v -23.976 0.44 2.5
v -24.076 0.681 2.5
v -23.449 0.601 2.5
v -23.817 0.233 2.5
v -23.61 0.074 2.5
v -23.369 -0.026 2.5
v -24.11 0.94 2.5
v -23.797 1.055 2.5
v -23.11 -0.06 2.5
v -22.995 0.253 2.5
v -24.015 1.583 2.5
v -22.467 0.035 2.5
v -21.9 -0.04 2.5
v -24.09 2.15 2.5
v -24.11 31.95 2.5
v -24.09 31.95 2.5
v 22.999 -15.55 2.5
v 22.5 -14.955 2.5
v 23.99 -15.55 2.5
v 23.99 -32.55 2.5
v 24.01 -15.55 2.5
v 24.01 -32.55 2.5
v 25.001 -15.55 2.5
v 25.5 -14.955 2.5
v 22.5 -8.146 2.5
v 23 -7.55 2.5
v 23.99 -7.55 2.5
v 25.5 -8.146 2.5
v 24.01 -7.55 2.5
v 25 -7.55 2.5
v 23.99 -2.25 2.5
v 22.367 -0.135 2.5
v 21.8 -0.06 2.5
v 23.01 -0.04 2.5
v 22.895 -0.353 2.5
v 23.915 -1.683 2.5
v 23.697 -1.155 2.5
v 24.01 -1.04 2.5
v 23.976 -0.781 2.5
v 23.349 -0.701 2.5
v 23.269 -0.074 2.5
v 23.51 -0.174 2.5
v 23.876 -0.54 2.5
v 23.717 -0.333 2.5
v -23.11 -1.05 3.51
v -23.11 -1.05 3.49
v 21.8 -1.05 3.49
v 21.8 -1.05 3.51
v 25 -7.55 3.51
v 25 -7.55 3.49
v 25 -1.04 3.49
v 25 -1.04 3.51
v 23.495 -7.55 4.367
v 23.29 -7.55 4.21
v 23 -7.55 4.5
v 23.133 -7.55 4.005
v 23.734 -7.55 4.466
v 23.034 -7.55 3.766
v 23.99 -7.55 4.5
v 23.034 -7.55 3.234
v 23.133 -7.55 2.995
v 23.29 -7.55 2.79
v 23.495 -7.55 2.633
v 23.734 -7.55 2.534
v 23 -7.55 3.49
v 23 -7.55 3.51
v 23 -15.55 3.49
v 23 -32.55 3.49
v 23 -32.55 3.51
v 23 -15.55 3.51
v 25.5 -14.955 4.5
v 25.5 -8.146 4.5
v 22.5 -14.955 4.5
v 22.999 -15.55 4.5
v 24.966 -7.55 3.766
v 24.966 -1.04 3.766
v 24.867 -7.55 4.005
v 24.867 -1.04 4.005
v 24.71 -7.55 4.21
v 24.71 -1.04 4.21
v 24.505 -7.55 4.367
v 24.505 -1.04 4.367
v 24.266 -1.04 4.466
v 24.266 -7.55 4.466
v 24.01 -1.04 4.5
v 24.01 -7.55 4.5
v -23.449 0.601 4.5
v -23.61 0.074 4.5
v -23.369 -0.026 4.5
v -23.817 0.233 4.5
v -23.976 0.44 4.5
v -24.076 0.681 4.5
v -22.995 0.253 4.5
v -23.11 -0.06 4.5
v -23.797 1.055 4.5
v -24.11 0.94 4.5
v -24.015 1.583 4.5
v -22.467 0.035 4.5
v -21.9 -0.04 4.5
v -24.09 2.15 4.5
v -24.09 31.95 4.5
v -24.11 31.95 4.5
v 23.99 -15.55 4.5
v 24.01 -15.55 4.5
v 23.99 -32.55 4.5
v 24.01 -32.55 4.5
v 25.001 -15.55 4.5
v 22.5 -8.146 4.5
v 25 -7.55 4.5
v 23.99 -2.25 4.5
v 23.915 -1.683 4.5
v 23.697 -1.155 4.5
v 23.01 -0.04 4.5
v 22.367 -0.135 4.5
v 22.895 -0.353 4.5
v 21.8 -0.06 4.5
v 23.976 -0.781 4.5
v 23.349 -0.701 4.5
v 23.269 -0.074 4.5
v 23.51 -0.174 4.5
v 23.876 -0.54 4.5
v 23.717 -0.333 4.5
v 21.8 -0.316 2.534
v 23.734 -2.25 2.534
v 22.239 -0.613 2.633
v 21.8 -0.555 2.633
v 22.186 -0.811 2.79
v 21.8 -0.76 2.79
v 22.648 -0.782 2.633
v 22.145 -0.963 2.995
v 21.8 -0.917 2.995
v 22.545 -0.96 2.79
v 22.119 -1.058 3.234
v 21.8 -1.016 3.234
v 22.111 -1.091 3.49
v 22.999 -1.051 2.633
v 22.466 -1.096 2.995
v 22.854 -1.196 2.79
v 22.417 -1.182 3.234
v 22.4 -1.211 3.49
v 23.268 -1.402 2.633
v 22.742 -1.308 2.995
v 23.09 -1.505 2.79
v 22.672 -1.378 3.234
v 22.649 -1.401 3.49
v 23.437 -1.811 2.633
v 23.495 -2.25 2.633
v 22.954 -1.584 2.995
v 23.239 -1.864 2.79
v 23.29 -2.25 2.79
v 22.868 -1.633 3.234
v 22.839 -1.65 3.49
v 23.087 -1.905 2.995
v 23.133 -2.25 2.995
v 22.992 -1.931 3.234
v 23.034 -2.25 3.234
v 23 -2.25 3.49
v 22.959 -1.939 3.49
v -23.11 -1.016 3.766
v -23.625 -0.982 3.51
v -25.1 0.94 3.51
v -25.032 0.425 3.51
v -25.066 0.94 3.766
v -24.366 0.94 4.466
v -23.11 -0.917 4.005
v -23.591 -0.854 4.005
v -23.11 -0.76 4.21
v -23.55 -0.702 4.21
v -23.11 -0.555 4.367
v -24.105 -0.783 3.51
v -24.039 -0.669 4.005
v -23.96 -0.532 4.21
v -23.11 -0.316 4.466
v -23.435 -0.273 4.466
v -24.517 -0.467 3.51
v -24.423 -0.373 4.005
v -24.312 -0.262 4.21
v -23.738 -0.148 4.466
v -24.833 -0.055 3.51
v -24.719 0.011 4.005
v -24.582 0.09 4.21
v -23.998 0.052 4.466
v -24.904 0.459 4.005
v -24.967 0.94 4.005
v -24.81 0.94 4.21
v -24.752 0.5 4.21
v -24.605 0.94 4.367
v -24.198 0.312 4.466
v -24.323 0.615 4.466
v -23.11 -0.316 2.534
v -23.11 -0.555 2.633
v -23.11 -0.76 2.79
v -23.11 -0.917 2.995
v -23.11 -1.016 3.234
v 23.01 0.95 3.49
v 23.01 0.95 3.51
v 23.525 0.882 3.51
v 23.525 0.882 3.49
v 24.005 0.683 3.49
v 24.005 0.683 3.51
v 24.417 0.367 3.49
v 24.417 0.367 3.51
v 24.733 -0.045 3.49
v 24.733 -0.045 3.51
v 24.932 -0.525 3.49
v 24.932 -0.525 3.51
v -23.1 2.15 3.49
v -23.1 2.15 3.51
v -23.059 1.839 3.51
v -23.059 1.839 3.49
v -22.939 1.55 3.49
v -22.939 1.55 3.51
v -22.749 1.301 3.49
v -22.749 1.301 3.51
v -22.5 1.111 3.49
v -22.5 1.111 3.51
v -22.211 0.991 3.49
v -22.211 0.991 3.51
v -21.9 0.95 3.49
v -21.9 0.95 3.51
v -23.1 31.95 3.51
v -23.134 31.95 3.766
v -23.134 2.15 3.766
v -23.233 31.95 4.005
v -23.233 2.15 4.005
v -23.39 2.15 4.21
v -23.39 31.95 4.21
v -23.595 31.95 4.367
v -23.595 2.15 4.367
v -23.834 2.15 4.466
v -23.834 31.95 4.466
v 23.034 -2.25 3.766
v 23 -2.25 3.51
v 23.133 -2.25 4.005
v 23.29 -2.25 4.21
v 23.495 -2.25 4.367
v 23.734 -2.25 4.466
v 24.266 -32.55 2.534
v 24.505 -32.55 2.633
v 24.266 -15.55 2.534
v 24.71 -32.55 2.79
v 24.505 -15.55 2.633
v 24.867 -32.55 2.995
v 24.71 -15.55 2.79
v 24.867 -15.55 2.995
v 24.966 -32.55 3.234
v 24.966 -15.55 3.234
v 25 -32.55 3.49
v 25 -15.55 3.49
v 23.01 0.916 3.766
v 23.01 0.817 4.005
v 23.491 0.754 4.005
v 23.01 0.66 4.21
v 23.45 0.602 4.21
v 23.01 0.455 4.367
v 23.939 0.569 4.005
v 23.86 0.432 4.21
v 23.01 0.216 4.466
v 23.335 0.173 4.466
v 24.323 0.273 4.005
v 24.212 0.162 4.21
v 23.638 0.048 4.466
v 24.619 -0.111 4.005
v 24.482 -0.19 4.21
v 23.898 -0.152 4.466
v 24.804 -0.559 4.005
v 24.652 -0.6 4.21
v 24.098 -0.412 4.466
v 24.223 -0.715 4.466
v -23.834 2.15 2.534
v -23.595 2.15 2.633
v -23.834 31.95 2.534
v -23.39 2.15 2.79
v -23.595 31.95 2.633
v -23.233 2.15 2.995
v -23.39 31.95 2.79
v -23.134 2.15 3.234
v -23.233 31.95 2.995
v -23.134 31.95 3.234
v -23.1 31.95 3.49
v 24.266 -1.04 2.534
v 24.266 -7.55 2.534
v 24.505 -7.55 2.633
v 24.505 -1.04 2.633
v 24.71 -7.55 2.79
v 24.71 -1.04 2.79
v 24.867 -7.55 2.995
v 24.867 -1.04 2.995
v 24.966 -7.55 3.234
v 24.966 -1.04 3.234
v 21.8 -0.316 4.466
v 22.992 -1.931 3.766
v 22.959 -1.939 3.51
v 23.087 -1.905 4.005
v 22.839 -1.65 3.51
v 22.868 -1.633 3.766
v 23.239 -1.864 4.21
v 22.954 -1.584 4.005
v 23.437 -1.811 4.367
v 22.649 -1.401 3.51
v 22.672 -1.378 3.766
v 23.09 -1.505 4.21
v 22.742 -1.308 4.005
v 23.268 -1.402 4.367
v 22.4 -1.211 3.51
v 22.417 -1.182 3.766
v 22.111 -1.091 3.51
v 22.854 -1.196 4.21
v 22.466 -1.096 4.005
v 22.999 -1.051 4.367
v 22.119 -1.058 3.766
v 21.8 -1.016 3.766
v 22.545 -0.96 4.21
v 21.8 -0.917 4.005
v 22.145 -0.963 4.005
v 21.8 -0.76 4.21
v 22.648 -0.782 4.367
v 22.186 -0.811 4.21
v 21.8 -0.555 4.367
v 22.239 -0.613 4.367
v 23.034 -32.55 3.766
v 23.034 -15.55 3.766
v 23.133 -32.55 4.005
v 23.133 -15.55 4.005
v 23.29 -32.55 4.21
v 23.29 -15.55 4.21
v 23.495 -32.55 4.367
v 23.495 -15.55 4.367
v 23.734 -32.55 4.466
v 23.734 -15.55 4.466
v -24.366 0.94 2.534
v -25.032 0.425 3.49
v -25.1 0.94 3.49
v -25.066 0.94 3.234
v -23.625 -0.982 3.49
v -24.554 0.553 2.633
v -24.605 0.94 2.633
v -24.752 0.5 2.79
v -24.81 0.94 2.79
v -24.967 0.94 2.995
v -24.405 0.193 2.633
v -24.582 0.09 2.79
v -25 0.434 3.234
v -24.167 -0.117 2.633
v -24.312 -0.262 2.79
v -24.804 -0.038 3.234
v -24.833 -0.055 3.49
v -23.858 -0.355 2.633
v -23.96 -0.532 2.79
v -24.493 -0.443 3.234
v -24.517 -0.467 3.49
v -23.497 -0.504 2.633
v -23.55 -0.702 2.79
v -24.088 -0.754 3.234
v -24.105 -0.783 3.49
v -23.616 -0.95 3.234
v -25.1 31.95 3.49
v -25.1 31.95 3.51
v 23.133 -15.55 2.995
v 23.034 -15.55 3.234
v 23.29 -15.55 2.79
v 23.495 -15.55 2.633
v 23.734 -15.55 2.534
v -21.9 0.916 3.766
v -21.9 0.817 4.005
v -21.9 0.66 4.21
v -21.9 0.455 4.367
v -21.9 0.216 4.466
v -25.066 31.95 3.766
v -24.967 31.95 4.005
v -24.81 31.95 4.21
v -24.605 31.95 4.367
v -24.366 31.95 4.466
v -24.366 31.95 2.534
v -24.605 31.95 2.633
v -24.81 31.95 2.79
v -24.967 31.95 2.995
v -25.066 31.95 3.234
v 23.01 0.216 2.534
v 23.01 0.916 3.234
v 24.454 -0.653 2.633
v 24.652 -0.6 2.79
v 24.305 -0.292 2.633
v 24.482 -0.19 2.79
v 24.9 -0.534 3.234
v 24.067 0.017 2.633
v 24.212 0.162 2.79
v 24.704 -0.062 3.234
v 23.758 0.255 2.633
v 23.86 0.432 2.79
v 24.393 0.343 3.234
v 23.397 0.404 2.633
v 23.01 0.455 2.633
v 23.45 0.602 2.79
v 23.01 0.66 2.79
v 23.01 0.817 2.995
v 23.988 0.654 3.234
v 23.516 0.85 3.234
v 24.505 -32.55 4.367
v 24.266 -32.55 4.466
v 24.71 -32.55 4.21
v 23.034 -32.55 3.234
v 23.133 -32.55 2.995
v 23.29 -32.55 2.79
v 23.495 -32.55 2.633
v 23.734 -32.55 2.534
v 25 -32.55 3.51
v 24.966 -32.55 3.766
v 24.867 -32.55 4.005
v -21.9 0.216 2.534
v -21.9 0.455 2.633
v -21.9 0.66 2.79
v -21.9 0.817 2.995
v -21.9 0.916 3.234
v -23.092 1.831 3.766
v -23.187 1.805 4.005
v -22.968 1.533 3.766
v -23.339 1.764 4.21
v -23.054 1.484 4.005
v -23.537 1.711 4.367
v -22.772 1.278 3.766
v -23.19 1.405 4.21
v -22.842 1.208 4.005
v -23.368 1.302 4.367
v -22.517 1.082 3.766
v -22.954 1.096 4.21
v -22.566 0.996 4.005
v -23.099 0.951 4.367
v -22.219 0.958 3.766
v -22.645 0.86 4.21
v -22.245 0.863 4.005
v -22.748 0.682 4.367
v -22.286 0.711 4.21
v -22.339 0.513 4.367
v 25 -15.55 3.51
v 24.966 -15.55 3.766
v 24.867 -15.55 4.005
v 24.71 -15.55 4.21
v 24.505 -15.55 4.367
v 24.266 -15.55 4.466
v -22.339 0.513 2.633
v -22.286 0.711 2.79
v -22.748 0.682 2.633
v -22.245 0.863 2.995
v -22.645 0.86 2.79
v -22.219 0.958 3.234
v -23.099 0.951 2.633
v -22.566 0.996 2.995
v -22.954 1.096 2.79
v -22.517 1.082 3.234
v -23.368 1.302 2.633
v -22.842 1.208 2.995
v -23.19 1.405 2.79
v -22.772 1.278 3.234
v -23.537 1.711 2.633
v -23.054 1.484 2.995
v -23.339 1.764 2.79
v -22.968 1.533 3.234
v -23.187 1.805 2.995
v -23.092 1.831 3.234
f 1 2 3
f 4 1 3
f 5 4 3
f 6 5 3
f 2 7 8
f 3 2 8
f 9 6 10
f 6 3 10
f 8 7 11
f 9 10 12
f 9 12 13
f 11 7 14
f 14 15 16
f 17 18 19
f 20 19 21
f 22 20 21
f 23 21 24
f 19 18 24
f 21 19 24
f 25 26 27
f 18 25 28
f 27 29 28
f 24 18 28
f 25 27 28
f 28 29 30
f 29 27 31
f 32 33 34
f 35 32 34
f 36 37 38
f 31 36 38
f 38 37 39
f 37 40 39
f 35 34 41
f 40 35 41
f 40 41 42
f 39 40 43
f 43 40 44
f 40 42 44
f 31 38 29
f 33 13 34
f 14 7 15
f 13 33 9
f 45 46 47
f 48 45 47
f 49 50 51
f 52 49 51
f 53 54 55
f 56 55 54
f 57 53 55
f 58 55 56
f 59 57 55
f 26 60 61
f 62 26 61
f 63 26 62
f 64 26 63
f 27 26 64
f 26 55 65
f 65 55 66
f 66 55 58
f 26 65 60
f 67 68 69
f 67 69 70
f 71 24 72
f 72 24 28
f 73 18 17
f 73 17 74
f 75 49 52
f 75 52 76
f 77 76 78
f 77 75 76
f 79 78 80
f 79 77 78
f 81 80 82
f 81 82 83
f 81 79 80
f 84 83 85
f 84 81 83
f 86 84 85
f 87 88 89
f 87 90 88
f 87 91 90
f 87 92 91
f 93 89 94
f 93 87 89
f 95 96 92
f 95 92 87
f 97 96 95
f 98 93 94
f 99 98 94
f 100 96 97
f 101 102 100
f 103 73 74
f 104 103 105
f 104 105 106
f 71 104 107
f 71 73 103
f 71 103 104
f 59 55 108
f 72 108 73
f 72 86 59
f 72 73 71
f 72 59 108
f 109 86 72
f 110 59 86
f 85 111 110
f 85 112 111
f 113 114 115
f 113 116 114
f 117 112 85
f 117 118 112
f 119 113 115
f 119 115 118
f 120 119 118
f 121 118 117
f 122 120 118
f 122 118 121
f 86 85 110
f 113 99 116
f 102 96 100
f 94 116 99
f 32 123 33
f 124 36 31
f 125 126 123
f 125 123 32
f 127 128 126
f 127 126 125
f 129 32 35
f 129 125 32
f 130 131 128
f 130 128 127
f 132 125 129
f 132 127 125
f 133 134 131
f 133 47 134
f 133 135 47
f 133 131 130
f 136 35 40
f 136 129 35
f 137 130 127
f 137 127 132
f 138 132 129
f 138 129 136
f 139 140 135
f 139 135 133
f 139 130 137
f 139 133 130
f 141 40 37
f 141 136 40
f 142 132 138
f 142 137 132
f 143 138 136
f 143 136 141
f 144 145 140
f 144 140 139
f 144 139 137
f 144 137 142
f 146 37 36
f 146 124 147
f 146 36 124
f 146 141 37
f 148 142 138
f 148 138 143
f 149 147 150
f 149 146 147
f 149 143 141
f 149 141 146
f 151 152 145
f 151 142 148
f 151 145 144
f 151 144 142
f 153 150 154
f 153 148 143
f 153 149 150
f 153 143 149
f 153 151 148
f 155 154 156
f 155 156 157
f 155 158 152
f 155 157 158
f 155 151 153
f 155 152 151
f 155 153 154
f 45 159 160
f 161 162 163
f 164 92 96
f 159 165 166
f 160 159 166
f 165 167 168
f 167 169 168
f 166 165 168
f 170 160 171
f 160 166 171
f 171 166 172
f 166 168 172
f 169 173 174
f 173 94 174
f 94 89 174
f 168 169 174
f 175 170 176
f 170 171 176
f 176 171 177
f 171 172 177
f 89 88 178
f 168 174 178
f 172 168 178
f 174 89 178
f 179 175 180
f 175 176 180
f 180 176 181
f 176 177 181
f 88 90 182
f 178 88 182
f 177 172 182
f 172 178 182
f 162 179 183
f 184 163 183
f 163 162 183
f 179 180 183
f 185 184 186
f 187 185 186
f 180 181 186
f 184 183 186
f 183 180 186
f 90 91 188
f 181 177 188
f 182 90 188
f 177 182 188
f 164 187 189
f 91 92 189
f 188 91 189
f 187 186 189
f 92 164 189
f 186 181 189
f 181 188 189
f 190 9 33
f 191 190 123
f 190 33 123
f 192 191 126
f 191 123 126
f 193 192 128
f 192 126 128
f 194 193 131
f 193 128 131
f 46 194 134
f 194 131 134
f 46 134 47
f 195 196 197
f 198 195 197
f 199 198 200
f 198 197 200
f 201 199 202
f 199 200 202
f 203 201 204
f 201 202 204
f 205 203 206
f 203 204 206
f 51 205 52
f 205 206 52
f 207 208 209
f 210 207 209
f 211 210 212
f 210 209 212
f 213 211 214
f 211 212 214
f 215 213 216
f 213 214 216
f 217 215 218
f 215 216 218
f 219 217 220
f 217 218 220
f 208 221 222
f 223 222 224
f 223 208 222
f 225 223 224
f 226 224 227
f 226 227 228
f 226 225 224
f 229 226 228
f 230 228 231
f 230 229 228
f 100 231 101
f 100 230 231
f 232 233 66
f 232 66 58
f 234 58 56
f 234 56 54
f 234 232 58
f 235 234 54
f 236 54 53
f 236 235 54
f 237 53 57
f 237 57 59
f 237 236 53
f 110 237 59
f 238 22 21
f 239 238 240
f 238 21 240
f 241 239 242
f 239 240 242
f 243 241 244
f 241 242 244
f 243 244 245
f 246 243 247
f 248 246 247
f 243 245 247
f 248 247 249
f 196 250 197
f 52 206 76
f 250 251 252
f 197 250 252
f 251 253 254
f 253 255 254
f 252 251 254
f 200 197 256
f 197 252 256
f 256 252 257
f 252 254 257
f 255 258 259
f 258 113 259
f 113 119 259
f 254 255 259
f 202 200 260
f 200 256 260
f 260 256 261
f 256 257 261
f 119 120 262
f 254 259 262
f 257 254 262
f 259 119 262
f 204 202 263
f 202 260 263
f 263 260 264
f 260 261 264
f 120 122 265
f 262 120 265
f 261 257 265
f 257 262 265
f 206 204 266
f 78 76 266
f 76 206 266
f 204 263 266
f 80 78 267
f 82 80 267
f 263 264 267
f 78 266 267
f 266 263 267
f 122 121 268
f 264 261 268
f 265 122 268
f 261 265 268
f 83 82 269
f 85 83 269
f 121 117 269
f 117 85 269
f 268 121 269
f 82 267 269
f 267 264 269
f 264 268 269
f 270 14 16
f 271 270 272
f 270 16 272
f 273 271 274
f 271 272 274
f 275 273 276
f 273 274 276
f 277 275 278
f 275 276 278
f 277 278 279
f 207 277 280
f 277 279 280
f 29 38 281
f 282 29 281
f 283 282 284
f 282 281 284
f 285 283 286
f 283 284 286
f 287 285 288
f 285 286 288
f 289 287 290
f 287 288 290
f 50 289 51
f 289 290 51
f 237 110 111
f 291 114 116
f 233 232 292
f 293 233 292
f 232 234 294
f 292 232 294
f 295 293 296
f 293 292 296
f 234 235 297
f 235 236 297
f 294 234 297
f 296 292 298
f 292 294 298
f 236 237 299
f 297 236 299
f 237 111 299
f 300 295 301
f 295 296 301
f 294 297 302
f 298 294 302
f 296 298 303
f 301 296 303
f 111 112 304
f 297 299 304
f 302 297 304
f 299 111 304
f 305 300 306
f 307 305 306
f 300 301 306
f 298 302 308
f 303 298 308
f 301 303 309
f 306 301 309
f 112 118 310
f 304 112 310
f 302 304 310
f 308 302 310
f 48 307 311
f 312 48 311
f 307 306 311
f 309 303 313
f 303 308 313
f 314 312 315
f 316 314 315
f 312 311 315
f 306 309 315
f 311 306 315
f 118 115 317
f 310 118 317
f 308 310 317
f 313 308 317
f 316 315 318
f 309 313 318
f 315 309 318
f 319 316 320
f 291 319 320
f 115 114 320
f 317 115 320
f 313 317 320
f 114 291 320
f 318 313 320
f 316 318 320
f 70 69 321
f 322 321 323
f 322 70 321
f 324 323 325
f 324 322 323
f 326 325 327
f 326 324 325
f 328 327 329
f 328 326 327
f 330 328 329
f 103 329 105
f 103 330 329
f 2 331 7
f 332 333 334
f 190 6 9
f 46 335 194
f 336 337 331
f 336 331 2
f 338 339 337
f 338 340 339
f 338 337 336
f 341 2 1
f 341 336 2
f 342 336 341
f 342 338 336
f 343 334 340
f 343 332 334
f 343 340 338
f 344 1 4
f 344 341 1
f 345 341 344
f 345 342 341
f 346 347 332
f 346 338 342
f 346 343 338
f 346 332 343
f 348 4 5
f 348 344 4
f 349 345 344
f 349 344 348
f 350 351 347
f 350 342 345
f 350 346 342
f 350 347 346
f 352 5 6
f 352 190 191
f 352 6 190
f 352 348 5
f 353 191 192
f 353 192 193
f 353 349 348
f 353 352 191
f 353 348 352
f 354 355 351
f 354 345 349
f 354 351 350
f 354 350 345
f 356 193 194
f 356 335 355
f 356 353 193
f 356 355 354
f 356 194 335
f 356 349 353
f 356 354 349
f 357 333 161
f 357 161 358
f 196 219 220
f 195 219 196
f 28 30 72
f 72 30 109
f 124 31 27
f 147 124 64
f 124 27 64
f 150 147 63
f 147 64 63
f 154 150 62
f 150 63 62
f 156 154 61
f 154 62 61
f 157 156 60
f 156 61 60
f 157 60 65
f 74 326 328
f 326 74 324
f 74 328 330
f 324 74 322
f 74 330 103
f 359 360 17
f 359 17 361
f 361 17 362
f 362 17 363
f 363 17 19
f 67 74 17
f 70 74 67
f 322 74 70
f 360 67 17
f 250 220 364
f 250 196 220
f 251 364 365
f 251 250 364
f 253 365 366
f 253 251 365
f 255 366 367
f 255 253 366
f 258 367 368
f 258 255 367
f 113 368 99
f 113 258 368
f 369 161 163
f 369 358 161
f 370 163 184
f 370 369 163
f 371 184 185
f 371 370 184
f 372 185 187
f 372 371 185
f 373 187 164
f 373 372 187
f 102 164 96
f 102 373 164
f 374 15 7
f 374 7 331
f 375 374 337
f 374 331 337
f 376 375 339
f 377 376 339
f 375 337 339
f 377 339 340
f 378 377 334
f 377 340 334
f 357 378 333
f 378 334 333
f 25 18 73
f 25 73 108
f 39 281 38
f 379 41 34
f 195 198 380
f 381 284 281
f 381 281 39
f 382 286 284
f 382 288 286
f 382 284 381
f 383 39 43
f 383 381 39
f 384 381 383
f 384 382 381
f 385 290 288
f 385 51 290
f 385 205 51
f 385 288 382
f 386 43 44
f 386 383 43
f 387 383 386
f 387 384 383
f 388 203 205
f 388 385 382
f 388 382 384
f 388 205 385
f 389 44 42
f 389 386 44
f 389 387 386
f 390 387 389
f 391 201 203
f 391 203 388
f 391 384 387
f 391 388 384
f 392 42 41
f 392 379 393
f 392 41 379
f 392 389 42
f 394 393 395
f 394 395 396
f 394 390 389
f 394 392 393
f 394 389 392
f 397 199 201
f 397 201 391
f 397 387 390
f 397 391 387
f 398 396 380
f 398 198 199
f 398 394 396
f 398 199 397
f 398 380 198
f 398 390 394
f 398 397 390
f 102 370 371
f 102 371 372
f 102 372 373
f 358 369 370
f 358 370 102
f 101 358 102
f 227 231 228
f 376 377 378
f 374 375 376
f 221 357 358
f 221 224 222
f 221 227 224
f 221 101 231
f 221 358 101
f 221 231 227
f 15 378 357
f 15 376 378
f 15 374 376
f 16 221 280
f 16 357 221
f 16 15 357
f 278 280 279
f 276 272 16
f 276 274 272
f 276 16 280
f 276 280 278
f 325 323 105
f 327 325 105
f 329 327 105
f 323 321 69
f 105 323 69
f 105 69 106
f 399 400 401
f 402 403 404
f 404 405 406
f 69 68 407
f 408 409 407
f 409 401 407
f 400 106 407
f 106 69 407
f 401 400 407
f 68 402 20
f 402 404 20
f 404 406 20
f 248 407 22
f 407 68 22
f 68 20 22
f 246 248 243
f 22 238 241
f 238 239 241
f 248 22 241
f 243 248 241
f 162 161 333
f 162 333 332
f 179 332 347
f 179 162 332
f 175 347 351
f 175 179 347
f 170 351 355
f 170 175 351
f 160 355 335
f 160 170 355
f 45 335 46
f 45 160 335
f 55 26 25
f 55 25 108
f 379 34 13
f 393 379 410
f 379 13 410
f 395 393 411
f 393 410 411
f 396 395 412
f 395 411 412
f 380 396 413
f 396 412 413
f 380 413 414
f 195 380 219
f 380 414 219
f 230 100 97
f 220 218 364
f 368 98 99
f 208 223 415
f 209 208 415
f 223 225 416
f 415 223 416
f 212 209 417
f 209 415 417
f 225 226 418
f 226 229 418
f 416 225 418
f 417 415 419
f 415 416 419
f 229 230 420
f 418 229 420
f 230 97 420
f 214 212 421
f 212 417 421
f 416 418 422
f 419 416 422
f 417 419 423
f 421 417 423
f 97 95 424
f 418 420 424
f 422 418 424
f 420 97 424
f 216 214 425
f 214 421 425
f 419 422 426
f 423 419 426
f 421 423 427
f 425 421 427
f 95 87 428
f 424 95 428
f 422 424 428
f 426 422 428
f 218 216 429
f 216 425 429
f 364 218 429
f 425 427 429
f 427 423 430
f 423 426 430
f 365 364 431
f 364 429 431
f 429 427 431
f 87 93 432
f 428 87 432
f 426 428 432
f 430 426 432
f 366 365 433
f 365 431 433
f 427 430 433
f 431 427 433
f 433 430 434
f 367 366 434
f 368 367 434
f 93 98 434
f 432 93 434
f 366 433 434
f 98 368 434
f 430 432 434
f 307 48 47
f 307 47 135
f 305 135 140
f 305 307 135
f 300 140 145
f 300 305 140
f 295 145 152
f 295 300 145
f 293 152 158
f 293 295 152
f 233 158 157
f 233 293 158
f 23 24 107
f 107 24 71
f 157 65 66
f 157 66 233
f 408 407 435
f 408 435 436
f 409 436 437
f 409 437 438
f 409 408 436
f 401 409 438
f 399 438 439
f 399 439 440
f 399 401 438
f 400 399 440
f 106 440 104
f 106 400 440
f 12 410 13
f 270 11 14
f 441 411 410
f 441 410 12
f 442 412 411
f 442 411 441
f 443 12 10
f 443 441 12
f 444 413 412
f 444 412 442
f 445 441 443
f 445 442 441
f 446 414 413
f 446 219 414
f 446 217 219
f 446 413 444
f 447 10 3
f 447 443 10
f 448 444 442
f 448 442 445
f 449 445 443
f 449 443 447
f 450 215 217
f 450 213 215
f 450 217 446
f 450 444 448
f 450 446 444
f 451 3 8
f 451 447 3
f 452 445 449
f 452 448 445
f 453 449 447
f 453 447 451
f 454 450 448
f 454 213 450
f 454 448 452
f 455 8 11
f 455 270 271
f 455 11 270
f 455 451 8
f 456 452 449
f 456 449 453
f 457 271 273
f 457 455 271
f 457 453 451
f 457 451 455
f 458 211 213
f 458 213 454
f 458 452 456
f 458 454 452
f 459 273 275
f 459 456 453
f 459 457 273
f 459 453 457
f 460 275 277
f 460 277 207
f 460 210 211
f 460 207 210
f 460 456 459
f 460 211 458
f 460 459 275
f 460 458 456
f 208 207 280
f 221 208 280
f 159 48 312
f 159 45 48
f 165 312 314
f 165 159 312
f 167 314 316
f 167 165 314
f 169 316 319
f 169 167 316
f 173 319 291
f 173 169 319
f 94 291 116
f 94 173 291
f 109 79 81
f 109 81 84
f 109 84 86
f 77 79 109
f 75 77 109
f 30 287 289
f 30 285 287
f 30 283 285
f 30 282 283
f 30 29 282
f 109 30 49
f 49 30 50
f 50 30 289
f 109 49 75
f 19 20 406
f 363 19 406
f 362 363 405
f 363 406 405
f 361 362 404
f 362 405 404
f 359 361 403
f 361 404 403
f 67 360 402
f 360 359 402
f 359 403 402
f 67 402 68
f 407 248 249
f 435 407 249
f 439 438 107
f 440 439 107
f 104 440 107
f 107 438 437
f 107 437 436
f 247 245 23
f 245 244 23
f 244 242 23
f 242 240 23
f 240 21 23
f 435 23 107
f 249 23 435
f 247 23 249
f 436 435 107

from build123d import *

# Parameters (mm, degrees)
BOX010_W           = 2
BOX010_H           = 33.5
BOX010_DEPTH       = 2
BOX011_W           = 46.1
BOX011_H           = 2
BOX011_DEPTH       = 2
BOX012_W           = 2
BOX012_H           = 33
BOX012_DEPTH       = 2
FILLET_R           = 1.99
FILLET001_R        = 1.2
FILLET002_R        = 0.99
BOX013_W           = 3
BOX013_H           = 8
BOX013_DEPTH       = 2
CHAMFER_1_ANGLE    = 50
CHAMFER_1_SIZE     = 0.499
CHAMFER_2_ANGLE    = 50
CHAMFER_2_SIZE     = 0.499
CHAMFER001_1_ANGLE = 40
CHAMFER001_1_SIZE  = 0.5955
CHAMFER001_2_ANGLE = 40
CHAMFER001_2_SIZE  = 0.5955


with BuildPart() as part:
    # Box010 → Box010 (join)
    with BuildSketch(Plane(origin=(23, -32, 2.5), x_dir=(1, 0, 0), z_dir=(0, 0, 1))):
        with Locations((1, 16.75)):
            Rectangle(BOX010_W, BOX010_H)
    extrude(amount=BOX010_DEPTH)

    # Box011 → Box011 (join)
    with BuildSketch(Plane(origin=(-23.1, -0.5, 2.5), x_dir=(1, 0, 0), z_dir=(0, 0, 1))):
        with Locations((23.05, 1)):
            Rectangle(BOX011_W, BOX011_H)
    extrude(amount=BOX011_DEPTH)

    # Box012 → Box012 (join)
    with BuildSketch(Plane(origin=(-25.1, -0.5, 2.5), x_dir=(1, 0, 0), z_dir=(0, 0, 1))):
        with Locations((1, 16.5)):
            Rectangle(BOX012_W, BOX012_H)
    extrude(amount=BOX012_DEPTH)

    # Fillet
    fillet_edges = [part.edges().sort_by_distance(p)[0] for p in [
        (-25.1, -0.5, 3.5),
        (25, 1.5, 3.5),
    ]]
    fillet(fillet_edges, radius=FILLET_R)

    # Fillet001
    fillet001_edges = [part.edges().sort_by_distance(p)[0] for p in [
        (23, -0.5, 3.5),
        (-23.1, 1.5, 3.5),
    ]]
    fillet(fillet001_edges, radius=FILLET001_R)

    # Fillet002
    fillet002_edges = [part.edges().sort_by_distance(p)[0] for p in [
        (24.417142, 0.917142, 4.5),
        (25, -16.245, 4.5),
        (0.55, 1.5, 4.5),
        (-22.748528, 1.851472, 4.5),
        (-23.1, 17.6, 4.5),
        (25, -16.245, 2.5),
        (24.417142, 0.917142, 2.5),
        (0.55, 1.5, 2.5),
        (-0.65, -0.5, 2.5),
        (22.648528, -0.851472, 2.5),
        (23, -16.85, 2.5),
        (-24.517142, 0.082858, 2.5),
        (-25.1, 16.995, 2.5),
        (-23.1, 17.6, 2.5),
        (-22.748528, 1.851472, 2.5),
        (23, -16.85, 4.5),
        (22.648528, -0.851472, 4.5),
        (-0.65, -0.5, 4.5),
        (-24.517142, 0.082858, 4.5),
        (-25.1, 16.995, 4.5),
        (-23.105, -0.5, 4.5),
    ]]
    fillet(fillet002_edges, radius=FILLET002_R)

    # Box013 → Box013 (join)
    with BuildSketch(Plane(origin=(22.5, -15, 2.5), x_dir=(1, 0, 0), z_dir=(0, 0, 1))):
        with Locations((1.5, 4)):
            Rectangle(BOX013_W, BOX013_H)
    extrude(amount=BOX013_DEPTH)

    # Chamfer 1
    chamfer_1_edges = [part.edges().sort_by_distance(p)[0] for p in [
        (22.5, -15, 3.5),
    ]]
    chamfer_1_side = part.faces().sort_by_distance((22.889504, -15, 3.5))[0]
    chamfer(chamfer_1_edges, length=CHAMFER_1_SIZE, angle=CHAMFER_1_ANGLE, reference=chamfer_1_side)

    # Chamfer 2
    chamfer_2_edges = [part.edges().sort_by_distance(p)[0] for p in [
        (25.5, -15, 3.5),
    ]]
    chamfer_2_side = part.faces().sort_by_distance((25.110496, -15, 3.5))[0]
    chamfer(chamfer_2_edges, length=CHAMFER_2_SIZE, angle=CHAMFER_2_ANGLE, reference=chamfer_2_side)

    # Chamfer001 1
    chamfer001_1_edges = [part.edges().sort_by_distance(p)[0] for p in [
        (25.5, -7, 3.5),
    ]]
    chamfer001_1_side = part.faces().sort_by_distance((25.5, -10.702657, 3.5))[0]
    chamfer(chamfer001_1_edges, length=CHAMFER001_1_SIZE, angle=CHAMFER001_1_ANGLE, reference=chamfer001_1_side)

    # Chamfer001 2
    chamfer001_2_edges = [part.edges().sort_by_distance(p)[0] for p in [
        (22.5, -7, 3.5),
    ]]
    chamfer001_2_side = part.faces().sort_by_distance((22.5, -10.702657, 3.5))[0]
    chamfer(chamfer001_2_edges, length=CHAMFER001_2_SIZE, angle=CHAMFER001_2_ANGLE, reference=chamfer001_2_side)


with BuildPart() as part_1:
    # Body001 placement: moved
    add(part.part.moved(Location((0, -0.55, 0))))


solid = part_1.part
